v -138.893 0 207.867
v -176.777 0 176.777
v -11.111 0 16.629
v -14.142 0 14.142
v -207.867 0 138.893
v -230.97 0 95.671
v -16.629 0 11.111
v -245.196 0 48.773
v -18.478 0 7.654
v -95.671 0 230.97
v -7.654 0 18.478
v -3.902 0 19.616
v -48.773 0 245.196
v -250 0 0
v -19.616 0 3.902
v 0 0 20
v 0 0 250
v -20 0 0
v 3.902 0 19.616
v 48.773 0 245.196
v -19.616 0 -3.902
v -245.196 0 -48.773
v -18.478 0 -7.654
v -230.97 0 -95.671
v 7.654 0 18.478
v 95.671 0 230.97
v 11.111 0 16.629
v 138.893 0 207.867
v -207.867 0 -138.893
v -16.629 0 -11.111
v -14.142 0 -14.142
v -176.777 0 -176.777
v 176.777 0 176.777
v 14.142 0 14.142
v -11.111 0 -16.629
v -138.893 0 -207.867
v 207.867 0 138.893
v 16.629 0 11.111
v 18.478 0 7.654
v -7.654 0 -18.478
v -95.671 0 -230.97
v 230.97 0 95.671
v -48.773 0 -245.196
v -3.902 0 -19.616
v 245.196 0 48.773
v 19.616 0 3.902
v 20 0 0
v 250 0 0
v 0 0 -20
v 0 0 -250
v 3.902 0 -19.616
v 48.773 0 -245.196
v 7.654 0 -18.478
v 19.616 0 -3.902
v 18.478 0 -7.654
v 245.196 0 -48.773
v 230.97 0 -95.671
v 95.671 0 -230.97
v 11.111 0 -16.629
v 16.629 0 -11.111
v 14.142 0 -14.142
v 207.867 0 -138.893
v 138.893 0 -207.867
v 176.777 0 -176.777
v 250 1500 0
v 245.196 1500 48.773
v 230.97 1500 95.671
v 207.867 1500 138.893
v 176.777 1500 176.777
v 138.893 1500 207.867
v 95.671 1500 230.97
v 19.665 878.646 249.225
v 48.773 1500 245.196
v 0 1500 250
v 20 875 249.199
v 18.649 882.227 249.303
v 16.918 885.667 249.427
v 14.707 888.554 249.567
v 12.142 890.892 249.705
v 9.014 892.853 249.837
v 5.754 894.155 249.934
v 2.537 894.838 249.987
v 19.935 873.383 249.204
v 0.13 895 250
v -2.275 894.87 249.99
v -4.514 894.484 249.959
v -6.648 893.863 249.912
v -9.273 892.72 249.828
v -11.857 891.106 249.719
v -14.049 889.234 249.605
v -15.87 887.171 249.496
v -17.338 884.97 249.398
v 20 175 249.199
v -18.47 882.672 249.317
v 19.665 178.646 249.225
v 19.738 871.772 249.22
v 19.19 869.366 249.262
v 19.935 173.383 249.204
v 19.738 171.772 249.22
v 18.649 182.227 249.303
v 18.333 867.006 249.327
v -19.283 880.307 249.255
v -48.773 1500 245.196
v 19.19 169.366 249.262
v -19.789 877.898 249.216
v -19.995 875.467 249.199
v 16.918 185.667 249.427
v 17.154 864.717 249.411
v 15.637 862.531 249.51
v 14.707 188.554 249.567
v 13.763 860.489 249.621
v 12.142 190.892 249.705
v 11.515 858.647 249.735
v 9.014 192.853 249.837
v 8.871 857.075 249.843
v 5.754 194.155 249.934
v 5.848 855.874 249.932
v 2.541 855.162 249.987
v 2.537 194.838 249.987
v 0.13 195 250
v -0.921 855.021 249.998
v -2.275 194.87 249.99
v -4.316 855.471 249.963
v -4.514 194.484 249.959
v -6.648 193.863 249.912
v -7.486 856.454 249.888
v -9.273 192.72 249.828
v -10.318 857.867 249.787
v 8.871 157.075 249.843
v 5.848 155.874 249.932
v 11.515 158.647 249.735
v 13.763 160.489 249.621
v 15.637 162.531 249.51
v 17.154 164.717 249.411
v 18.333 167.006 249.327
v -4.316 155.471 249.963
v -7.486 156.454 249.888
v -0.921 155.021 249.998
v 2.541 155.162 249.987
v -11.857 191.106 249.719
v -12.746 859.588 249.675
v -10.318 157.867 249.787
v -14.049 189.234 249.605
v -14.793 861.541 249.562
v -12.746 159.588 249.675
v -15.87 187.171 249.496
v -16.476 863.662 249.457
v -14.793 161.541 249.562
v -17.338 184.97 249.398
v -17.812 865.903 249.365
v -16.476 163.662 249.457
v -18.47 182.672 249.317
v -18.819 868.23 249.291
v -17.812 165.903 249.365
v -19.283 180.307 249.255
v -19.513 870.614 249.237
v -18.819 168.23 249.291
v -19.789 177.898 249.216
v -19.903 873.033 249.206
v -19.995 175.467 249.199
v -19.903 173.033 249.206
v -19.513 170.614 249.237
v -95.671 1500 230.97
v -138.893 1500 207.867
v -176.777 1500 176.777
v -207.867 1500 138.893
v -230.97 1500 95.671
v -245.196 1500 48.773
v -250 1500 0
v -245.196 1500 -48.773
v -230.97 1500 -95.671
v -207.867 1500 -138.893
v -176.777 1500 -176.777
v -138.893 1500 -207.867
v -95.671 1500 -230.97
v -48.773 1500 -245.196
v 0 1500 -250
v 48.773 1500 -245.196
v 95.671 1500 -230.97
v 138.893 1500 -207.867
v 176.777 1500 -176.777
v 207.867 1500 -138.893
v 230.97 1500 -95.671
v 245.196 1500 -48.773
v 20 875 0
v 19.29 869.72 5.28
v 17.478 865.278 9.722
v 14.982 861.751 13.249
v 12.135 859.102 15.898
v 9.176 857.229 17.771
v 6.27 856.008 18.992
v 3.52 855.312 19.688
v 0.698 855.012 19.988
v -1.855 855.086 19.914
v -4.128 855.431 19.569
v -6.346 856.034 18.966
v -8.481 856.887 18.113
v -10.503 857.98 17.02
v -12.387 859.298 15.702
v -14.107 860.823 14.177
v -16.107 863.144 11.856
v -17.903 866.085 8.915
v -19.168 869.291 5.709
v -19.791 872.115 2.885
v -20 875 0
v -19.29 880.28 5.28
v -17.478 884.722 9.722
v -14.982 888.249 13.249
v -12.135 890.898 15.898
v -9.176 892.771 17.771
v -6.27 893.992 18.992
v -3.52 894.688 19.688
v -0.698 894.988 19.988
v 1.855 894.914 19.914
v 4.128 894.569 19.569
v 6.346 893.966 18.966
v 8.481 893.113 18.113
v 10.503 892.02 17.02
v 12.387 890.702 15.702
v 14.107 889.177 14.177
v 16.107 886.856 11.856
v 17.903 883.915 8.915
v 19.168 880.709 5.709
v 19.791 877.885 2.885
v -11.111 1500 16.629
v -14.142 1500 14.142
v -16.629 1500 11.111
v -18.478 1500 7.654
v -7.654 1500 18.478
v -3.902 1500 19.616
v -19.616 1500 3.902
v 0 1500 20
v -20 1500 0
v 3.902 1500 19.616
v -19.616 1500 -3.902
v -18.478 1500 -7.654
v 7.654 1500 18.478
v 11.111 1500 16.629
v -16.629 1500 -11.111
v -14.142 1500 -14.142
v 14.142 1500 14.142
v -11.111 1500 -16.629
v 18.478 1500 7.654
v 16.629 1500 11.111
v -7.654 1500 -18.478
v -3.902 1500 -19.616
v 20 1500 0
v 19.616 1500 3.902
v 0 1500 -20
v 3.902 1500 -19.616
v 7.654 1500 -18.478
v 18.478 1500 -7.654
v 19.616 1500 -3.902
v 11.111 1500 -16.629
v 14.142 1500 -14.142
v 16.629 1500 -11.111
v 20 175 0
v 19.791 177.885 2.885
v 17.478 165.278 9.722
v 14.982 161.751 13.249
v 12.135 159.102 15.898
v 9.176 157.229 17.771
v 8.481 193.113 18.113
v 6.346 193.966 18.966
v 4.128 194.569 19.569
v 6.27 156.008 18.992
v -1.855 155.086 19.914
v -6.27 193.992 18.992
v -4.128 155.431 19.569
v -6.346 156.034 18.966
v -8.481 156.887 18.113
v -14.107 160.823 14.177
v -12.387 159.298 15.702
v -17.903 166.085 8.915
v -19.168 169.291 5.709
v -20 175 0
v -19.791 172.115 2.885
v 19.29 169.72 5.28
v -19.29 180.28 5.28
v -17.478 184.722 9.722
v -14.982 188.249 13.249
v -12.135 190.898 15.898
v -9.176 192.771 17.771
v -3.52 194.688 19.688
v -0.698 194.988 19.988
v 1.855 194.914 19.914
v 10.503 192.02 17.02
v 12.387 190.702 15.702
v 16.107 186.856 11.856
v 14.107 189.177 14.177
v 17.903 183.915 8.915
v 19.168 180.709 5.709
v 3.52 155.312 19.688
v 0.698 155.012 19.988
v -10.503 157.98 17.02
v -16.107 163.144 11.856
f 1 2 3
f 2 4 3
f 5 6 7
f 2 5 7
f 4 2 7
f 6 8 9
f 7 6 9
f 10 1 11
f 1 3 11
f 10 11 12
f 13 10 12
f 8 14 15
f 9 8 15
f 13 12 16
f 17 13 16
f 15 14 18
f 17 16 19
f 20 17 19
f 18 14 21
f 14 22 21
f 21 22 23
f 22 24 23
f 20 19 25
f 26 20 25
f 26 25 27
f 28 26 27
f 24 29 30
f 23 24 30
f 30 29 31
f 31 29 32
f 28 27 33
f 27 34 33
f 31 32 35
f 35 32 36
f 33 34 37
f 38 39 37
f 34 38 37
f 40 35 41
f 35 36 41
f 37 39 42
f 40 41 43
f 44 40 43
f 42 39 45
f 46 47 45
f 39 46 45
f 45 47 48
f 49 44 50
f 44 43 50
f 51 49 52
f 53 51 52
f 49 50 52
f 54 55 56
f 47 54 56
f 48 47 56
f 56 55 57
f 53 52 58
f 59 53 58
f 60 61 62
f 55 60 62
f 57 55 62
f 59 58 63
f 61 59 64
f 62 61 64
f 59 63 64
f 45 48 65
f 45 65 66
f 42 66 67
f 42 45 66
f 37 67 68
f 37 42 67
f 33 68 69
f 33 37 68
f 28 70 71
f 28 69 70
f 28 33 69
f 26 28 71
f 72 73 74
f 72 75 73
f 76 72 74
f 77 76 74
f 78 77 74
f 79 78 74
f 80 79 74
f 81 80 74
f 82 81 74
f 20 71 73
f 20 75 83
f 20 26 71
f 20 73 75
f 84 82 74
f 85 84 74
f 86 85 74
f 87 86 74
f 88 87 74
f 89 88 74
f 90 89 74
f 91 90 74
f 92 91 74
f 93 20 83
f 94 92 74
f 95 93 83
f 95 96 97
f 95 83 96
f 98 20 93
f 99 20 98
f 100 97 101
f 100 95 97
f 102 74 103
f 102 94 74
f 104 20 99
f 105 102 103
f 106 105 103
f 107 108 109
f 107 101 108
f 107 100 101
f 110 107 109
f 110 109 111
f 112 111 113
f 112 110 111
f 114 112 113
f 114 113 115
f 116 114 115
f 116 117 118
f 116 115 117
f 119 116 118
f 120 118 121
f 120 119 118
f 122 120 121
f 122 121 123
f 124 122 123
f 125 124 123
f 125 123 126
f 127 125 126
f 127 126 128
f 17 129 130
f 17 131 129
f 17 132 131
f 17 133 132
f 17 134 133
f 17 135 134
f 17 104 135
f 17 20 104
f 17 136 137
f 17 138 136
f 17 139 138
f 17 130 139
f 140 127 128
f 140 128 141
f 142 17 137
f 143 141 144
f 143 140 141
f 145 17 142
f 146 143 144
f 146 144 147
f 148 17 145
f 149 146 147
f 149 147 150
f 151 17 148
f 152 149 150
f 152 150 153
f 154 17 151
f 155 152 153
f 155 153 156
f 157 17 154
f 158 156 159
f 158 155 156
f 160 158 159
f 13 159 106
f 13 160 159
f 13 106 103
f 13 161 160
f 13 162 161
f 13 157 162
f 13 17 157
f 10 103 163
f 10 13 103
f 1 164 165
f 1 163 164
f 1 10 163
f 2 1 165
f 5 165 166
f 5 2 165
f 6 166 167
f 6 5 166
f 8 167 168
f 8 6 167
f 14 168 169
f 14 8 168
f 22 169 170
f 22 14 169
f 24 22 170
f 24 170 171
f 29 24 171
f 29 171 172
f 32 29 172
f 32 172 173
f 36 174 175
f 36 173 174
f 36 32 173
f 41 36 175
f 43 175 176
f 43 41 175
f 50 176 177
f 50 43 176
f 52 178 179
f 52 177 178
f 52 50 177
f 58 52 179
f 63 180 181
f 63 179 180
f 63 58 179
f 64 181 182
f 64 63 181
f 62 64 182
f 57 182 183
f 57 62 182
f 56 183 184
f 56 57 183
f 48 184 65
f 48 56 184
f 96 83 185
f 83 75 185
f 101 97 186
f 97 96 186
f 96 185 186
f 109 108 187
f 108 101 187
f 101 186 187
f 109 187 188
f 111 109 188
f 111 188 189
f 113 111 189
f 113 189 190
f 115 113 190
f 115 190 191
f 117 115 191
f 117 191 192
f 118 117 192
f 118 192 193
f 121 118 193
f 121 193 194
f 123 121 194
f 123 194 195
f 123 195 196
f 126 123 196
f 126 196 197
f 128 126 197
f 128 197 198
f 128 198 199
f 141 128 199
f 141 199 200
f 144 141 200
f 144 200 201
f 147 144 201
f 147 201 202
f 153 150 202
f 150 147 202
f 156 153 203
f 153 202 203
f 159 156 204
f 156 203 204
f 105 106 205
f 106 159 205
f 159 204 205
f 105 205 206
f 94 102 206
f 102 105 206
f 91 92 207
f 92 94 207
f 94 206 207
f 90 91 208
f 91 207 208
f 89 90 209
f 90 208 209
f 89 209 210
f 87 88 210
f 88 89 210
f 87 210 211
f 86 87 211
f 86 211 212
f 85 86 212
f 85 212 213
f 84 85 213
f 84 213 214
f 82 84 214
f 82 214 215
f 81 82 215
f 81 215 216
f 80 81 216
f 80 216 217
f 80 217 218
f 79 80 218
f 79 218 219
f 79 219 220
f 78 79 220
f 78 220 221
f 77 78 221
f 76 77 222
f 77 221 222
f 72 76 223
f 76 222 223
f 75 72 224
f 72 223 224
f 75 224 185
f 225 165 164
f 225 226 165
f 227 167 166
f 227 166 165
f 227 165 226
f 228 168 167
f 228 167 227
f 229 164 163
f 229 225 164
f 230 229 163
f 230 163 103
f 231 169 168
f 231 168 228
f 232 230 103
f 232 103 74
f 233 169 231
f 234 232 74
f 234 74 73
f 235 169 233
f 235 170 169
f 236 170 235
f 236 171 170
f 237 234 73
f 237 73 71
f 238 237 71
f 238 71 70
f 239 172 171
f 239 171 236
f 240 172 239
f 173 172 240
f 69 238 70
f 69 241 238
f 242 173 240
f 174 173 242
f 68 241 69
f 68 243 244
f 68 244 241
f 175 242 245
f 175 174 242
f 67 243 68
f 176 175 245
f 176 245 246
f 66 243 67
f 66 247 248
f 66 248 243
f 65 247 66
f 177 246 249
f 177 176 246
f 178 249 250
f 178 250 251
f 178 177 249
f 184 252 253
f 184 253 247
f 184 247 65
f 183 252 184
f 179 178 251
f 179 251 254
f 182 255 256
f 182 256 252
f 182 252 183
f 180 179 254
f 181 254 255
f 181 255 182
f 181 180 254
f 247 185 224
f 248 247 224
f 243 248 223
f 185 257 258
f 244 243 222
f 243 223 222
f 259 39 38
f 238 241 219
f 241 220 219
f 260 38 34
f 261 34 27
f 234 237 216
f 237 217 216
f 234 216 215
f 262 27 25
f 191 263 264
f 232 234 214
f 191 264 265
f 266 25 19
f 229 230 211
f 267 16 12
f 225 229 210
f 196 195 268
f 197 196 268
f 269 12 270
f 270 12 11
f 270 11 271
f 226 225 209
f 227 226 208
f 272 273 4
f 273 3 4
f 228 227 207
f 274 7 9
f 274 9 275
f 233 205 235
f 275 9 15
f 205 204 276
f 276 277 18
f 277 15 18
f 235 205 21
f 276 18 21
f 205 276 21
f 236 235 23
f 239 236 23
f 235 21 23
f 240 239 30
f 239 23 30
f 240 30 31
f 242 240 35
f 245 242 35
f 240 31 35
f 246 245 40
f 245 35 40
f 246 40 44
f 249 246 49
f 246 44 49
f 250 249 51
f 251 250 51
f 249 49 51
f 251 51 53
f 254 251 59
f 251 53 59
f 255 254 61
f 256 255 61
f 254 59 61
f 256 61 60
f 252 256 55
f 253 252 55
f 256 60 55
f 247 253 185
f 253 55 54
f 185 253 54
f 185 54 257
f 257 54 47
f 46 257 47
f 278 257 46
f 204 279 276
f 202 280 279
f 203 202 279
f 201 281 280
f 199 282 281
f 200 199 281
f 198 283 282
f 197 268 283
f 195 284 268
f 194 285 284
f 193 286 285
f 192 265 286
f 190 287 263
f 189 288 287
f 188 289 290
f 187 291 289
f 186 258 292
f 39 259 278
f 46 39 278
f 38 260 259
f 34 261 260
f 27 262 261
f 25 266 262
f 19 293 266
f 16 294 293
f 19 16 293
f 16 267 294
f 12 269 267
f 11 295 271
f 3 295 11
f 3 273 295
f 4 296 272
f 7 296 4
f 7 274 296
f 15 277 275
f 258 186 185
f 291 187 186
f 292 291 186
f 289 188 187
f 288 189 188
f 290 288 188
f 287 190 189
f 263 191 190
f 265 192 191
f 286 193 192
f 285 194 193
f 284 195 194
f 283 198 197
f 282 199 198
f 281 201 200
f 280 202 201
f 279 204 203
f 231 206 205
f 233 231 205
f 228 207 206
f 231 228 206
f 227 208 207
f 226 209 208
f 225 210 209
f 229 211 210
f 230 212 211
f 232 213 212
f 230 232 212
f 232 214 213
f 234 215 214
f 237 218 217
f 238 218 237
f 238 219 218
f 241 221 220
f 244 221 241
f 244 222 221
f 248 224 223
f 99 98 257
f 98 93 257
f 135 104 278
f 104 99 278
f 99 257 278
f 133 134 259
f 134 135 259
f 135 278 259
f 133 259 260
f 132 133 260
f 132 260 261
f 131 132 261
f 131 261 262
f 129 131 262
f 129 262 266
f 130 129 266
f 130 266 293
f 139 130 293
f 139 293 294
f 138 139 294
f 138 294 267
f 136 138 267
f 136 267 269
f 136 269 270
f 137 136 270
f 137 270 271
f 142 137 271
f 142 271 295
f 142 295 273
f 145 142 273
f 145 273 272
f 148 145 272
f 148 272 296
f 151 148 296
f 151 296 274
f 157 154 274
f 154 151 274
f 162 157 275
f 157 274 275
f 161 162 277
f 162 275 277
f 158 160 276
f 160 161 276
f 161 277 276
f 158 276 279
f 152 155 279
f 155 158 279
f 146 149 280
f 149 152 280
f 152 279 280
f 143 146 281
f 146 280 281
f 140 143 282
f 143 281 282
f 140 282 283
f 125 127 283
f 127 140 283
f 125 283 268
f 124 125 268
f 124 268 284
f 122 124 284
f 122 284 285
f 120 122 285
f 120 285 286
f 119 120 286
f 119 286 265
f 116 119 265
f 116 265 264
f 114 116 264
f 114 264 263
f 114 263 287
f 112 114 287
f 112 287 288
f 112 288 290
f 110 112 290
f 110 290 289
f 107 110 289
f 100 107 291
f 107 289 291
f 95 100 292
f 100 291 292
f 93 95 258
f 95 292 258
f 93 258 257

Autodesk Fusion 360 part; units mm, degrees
sketch "Sketch1" plane through (0, 0, 0) normal (0, 1, 0) x (1, 0, 0) in component "Component"
  circle A0 centre (0, 0) radius 250
  dimension "d7" = 500
extrude "Extrude1" add sketch "Sketch1" along normal blind 1500 in component "Component"
sketch "Sketch2" plane through (0, 0, 0) normal (0, 0, 1) x (1, 0, 0) in component "Component"
  circle A0 centre (0, 175) radius 20
  line L0 (0, 0) -> (0, 1500) construction
  circle A1 centre (0, 875) radius 20
  dimension "d10" = 40
  dimension "d11" = 1500
  dimension "d13" = 175
  dimension "d14" = 40
  dimension "d15" = 700
extrude "Extrude2" cut sketch "Sketch2" along normal blind 475 in component "Component"
sketch "Sketch3" plane through (0, 0, 0) normal (0, -1, 0) x (1, 0, 0) in component "Component"
  circle A0 centre (0, 0) radius 250
  circle A1 centre (0, 0) radius 20
  dimension "d18" = 40
extrude "Extrude3" cut sketch "Sketch3" against normal blind 1700 contours A1 in component "Component"
component "Component" placed x (1, 0, 0) y (0, 1, 0) z (0, 0, 1) at (0, 0, 0)
